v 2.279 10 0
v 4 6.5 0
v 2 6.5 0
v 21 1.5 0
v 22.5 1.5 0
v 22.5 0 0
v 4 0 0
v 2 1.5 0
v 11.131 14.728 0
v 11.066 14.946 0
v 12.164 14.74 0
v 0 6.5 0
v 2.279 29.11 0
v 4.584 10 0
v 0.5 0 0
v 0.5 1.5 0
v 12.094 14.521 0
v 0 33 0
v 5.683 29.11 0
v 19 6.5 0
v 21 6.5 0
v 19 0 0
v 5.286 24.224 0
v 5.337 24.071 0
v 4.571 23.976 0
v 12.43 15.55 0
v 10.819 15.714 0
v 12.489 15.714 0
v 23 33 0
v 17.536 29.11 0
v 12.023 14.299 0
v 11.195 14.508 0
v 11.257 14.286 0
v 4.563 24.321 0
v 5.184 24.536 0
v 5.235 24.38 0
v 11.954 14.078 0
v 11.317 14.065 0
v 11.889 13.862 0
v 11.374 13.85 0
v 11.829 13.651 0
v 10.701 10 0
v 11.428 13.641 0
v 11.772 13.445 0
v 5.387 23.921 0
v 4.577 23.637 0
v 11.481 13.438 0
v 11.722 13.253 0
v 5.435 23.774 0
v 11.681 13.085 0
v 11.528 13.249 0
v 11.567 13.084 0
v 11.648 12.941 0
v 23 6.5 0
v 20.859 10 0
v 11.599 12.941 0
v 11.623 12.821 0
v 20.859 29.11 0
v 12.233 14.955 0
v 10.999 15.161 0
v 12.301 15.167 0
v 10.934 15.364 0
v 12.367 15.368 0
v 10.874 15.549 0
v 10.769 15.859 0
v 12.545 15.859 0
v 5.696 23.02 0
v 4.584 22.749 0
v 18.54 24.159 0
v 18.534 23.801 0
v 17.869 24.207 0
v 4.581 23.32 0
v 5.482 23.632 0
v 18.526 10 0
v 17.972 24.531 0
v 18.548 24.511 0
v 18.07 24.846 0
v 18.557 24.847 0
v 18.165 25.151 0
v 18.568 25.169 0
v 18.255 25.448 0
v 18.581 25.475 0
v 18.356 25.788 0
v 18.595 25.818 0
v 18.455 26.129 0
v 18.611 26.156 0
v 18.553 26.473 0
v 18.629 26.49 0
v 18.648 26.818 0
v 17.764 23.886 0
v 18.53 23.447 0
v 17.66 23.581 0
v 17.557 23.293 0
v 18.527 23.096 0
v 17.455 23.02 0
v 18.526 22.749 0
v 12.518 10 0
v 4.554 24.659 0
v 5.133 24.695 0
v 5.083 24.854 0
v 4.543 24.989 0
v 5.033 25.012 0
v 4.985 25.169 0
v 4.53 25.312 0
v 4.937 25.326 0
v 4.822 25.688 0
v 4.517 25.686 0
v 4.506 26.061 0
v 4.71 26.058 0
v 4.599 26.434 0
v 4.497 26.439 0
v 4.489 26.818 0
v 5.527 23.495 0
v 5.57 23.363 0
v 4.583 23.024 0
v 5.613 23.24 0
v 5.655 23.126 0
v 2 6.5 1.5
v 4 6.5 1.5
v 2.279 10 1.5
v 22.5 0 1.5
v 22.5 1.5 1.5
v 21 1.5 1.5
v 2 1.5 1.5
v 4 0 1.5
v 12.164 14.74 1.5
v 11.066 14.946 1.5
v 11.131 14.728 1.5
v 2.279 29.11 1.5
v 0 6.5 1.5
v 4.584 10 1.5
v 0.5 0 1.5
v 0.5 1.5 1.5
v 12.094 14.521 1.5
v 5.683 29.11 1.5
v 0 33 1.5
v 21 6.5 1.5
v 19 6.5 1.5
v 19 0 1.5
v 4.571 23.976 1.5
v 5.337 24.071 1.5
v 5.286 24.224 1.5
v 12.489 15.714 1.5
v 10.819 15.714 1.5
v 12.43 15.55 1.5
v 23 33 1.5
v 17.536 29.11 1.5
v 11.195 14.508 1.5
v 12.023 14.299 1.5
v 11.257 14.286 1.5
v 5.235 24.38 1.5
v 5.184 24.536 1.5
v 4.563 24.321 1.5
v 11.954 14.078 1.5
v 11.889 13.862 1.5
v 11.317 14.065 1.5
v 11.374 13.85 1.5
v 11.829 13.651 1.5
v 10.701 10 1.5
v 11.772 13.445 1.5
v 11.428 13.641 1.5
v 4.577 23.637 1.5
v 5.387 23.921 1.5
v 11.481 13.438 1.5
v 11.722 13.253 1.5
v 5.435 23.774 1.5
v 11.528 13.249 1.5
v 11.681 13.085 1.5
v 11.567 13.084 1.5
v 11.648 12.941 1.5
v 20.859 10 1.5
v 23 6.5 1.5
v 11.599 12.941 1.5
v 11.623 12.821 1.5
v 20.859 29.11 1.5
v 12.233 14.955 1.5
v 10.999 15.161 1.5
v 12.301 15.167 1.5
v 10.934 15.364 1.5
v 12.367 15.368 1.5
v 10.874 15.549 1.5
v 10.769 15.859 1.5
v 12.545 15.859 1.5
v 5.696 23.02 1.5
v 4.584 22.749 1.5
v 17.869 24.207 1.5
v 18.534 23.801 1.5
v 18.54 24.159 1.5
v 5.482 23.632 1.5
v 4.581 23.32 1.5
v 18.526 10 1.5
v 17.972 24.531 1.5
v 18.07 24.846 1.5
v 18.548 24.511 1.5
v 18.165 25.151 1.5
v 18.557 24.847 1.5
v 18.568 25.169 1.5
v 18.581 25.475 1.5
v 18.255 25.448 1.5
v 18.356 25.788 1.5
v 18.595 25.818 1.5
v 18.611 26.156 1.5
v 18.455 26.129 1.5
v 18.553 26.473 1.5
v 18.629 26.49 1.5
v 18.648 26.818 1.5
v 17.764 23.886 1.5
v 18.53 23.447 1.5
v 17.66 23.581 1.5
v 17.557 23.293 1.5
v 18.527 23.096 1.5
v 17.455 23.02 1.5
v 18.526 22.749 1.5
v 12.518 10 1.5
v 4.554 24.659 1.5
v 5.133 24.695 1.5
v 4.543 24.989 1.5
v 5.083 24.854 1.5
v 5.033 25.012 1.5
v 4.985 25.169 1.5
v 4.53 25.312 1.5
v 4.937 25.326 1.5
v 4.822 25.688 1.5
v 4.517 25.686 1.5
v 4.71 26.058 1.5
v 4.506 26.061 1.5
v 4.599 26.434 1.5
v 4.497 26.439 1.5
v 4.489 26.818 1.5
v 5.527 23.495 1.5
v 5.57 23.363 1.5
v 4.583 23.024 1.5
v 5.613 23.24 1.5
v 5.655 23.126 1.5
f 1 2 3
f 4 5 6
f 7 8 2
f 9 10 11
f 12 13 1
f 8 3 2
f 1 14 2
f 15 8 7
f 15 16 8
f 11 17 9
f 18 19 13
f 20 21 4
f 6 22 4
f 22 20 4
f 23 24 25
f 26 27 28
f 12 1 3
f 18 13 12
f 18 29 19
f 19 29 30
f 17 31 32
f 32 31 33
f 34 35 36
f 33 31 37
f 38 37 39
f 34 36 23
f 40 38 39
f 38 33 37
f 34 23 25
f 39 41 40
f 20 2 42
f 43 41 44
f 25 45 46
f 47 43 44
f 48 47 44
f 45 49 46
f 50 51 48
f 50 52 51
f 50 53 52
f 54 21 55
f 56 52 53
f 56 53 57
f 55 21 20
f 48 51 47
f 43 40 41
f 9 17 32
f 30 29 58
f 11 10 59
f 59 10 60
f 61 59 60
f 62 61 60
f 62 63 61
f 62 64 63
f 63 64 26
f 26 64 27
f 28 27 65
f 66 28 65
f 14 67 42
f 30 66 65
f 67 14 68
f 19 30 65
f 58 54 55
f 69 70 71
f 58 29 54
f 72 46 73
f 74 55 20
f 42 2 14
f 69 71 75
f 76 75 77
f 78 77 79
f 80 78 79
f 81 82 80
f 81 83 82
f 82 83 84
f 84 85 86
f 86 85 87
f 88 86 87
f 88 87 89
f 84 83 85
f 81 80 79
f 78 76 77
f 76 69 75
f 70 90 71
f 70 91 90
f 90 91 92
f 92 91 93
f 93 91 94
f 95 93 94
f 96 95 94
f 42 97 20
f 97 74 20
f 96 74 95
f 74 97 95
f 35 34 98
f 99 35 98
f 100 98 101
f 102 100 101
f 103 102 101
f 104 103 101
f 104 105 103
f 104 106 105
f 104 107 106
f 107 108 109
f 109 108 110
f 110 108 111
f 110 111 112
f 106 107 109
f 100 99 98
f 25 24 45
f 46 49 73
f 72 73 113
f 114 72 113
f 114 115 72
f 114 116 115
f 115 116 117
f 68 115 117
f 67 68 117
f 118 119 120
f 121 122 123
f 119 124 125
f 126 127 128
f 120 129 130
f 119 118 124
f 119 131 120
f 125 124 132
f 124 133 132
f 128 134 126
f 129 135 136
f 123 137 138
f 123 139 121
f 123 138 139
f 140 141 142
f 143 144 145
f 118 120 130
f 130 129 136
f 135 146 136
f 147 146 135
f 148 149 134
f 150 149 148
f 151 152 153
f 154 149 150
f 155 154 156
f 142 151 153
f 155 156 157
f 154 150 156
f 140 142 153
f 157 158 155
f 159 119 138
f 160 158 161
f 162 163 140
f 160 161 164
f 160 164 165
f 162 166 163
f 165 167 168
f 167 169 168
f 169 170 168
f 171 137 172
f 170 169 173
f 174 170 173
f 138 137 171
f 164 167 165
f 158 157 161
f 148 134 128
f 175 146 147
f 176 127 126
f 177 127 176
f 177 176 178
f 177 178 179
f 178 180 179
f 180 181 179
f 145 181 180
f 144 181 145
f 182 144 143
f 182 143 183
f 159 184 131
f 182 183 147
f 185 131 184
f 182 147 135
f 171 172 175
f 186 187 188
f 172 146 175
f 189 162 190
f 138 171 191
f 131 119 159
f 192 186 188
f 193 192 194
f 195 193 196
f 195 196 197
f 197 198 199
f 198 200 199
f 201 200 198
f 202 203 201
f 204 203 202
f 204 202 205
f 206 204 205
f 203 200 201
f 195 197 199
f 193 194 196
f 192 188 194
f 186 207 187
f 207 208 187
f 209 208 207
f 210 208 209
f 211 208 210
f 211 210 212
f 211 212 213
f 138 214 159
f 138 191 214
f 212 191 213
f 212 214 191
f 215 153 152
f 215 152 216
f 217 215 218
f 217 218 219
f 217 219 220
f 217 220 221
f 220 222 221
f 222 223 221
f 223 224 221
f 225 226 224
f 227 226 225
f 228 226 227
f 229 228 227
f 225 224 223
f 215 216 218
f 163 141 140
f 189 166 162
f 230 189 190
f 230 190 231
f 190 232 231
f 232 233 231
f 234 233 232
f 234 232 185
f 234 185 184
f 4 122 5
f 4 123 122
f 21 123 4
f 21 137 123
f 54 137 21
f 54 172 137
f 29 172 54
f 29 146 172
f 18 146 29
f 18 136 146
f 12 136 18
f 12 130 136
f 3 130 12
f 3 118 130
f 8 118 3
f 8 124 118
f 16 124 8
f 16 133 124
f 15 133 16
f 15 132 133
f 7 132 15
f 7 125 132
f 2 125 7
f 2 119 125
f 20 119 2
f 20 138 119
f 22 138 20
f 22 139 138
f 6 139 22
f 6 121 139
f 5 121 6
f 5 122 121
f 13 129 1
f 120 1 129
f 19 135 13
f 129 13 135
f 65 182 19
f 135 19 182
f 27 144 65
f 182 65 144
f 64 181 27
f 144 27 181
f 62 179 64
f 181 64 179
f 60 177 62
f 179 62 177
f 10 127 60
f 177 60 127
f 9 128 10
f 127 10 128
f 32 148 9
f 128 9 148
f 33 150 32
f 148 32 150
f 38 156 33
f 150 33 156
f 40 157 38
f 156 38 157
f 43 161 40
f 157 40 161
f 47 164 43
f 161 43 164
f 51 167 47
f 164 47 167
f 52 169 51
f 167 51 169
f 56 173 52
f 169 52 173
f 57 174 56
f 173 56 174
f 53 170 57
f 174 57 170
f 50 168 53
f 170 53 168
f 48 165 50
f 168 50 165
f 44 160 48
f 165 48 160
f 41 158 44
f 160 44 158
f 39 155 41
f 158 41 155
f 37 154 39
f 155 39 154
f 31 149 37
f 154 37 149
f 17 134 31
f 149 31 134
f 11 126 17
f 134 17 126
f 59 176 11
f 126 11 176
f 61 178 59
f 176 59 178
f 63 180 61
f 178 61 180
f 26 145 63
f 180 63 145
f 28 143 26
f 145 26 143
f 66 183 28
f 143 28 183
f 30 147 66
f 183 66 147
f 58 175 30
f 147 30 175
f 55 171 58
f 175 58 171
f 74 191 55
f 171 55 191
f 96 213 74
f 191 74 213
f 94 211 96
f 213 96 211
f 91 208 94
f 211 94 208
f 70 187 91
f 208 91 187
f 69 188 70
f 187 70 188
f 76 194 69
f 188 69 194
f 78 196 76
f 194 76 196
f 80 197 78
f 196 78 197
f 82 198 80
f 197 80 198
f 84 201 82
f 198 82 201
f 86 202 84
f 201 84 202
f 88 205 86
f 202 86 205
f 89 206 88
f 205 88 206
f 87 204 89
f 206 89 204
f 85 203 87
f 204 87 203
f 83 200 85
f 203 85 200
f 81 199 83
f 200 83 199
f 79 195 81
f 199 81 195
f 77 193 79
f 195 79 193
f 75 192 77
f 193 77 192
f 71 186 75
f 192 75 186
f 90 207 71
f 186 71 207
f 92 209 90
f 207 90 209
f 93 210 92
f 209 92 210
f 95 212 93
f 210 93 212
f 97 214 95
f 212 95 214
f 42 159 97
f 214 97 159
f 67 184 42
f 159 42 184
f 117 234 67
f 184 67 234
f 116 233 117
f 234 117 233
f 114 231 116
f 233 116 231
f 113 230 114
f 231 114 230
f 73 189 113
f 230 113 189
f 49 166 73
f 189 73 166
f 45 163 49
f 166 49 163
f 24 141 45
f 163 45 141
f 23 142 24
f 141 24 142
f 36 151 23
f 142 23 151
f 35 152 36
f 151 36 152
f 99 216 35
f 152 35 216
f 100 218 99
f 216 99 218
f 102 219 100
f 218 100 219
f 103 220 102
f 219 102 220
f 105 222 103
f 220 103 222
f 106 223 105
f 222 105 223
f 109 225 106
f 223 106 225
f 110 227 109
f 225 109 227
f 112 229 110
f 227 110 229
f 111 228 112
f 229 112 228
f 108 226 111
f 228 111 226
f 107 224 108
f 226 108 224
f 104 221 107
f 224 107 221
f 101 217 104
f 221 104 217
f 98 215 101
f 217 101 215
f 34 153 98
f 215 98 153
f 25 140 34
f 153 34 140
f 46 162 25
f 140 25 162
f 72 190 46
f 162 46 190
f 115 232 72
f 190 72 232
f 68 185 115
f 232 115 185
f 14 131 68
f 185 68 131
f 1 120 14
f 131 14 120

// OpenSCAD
// file: _action_card_module.scad
module 2d_action_card(letter, letter_offset) {
    width=23;
    height=33;
    difference() {
            square([width, height]);
            translate([-1, 1.5, 0]) square([3, 5]);
            translate([-1, -1, 0]) square([1.5, 4]);
            translate([4, -1.5, 0]) square([width-8, 8]);
            translate([width-2, 1.5, 0]) square([3, 5]);
            translate([width-0.5, -1, 0]) square([2, 4]);
            translate([letter_offset, 10, 0]) text(letter, 20);
        }
}
// main file
include <_action_card_module.scad>;

linear_extrude(1.5) {
    union() {
        2d_action_card("M", 0);
    }
}
